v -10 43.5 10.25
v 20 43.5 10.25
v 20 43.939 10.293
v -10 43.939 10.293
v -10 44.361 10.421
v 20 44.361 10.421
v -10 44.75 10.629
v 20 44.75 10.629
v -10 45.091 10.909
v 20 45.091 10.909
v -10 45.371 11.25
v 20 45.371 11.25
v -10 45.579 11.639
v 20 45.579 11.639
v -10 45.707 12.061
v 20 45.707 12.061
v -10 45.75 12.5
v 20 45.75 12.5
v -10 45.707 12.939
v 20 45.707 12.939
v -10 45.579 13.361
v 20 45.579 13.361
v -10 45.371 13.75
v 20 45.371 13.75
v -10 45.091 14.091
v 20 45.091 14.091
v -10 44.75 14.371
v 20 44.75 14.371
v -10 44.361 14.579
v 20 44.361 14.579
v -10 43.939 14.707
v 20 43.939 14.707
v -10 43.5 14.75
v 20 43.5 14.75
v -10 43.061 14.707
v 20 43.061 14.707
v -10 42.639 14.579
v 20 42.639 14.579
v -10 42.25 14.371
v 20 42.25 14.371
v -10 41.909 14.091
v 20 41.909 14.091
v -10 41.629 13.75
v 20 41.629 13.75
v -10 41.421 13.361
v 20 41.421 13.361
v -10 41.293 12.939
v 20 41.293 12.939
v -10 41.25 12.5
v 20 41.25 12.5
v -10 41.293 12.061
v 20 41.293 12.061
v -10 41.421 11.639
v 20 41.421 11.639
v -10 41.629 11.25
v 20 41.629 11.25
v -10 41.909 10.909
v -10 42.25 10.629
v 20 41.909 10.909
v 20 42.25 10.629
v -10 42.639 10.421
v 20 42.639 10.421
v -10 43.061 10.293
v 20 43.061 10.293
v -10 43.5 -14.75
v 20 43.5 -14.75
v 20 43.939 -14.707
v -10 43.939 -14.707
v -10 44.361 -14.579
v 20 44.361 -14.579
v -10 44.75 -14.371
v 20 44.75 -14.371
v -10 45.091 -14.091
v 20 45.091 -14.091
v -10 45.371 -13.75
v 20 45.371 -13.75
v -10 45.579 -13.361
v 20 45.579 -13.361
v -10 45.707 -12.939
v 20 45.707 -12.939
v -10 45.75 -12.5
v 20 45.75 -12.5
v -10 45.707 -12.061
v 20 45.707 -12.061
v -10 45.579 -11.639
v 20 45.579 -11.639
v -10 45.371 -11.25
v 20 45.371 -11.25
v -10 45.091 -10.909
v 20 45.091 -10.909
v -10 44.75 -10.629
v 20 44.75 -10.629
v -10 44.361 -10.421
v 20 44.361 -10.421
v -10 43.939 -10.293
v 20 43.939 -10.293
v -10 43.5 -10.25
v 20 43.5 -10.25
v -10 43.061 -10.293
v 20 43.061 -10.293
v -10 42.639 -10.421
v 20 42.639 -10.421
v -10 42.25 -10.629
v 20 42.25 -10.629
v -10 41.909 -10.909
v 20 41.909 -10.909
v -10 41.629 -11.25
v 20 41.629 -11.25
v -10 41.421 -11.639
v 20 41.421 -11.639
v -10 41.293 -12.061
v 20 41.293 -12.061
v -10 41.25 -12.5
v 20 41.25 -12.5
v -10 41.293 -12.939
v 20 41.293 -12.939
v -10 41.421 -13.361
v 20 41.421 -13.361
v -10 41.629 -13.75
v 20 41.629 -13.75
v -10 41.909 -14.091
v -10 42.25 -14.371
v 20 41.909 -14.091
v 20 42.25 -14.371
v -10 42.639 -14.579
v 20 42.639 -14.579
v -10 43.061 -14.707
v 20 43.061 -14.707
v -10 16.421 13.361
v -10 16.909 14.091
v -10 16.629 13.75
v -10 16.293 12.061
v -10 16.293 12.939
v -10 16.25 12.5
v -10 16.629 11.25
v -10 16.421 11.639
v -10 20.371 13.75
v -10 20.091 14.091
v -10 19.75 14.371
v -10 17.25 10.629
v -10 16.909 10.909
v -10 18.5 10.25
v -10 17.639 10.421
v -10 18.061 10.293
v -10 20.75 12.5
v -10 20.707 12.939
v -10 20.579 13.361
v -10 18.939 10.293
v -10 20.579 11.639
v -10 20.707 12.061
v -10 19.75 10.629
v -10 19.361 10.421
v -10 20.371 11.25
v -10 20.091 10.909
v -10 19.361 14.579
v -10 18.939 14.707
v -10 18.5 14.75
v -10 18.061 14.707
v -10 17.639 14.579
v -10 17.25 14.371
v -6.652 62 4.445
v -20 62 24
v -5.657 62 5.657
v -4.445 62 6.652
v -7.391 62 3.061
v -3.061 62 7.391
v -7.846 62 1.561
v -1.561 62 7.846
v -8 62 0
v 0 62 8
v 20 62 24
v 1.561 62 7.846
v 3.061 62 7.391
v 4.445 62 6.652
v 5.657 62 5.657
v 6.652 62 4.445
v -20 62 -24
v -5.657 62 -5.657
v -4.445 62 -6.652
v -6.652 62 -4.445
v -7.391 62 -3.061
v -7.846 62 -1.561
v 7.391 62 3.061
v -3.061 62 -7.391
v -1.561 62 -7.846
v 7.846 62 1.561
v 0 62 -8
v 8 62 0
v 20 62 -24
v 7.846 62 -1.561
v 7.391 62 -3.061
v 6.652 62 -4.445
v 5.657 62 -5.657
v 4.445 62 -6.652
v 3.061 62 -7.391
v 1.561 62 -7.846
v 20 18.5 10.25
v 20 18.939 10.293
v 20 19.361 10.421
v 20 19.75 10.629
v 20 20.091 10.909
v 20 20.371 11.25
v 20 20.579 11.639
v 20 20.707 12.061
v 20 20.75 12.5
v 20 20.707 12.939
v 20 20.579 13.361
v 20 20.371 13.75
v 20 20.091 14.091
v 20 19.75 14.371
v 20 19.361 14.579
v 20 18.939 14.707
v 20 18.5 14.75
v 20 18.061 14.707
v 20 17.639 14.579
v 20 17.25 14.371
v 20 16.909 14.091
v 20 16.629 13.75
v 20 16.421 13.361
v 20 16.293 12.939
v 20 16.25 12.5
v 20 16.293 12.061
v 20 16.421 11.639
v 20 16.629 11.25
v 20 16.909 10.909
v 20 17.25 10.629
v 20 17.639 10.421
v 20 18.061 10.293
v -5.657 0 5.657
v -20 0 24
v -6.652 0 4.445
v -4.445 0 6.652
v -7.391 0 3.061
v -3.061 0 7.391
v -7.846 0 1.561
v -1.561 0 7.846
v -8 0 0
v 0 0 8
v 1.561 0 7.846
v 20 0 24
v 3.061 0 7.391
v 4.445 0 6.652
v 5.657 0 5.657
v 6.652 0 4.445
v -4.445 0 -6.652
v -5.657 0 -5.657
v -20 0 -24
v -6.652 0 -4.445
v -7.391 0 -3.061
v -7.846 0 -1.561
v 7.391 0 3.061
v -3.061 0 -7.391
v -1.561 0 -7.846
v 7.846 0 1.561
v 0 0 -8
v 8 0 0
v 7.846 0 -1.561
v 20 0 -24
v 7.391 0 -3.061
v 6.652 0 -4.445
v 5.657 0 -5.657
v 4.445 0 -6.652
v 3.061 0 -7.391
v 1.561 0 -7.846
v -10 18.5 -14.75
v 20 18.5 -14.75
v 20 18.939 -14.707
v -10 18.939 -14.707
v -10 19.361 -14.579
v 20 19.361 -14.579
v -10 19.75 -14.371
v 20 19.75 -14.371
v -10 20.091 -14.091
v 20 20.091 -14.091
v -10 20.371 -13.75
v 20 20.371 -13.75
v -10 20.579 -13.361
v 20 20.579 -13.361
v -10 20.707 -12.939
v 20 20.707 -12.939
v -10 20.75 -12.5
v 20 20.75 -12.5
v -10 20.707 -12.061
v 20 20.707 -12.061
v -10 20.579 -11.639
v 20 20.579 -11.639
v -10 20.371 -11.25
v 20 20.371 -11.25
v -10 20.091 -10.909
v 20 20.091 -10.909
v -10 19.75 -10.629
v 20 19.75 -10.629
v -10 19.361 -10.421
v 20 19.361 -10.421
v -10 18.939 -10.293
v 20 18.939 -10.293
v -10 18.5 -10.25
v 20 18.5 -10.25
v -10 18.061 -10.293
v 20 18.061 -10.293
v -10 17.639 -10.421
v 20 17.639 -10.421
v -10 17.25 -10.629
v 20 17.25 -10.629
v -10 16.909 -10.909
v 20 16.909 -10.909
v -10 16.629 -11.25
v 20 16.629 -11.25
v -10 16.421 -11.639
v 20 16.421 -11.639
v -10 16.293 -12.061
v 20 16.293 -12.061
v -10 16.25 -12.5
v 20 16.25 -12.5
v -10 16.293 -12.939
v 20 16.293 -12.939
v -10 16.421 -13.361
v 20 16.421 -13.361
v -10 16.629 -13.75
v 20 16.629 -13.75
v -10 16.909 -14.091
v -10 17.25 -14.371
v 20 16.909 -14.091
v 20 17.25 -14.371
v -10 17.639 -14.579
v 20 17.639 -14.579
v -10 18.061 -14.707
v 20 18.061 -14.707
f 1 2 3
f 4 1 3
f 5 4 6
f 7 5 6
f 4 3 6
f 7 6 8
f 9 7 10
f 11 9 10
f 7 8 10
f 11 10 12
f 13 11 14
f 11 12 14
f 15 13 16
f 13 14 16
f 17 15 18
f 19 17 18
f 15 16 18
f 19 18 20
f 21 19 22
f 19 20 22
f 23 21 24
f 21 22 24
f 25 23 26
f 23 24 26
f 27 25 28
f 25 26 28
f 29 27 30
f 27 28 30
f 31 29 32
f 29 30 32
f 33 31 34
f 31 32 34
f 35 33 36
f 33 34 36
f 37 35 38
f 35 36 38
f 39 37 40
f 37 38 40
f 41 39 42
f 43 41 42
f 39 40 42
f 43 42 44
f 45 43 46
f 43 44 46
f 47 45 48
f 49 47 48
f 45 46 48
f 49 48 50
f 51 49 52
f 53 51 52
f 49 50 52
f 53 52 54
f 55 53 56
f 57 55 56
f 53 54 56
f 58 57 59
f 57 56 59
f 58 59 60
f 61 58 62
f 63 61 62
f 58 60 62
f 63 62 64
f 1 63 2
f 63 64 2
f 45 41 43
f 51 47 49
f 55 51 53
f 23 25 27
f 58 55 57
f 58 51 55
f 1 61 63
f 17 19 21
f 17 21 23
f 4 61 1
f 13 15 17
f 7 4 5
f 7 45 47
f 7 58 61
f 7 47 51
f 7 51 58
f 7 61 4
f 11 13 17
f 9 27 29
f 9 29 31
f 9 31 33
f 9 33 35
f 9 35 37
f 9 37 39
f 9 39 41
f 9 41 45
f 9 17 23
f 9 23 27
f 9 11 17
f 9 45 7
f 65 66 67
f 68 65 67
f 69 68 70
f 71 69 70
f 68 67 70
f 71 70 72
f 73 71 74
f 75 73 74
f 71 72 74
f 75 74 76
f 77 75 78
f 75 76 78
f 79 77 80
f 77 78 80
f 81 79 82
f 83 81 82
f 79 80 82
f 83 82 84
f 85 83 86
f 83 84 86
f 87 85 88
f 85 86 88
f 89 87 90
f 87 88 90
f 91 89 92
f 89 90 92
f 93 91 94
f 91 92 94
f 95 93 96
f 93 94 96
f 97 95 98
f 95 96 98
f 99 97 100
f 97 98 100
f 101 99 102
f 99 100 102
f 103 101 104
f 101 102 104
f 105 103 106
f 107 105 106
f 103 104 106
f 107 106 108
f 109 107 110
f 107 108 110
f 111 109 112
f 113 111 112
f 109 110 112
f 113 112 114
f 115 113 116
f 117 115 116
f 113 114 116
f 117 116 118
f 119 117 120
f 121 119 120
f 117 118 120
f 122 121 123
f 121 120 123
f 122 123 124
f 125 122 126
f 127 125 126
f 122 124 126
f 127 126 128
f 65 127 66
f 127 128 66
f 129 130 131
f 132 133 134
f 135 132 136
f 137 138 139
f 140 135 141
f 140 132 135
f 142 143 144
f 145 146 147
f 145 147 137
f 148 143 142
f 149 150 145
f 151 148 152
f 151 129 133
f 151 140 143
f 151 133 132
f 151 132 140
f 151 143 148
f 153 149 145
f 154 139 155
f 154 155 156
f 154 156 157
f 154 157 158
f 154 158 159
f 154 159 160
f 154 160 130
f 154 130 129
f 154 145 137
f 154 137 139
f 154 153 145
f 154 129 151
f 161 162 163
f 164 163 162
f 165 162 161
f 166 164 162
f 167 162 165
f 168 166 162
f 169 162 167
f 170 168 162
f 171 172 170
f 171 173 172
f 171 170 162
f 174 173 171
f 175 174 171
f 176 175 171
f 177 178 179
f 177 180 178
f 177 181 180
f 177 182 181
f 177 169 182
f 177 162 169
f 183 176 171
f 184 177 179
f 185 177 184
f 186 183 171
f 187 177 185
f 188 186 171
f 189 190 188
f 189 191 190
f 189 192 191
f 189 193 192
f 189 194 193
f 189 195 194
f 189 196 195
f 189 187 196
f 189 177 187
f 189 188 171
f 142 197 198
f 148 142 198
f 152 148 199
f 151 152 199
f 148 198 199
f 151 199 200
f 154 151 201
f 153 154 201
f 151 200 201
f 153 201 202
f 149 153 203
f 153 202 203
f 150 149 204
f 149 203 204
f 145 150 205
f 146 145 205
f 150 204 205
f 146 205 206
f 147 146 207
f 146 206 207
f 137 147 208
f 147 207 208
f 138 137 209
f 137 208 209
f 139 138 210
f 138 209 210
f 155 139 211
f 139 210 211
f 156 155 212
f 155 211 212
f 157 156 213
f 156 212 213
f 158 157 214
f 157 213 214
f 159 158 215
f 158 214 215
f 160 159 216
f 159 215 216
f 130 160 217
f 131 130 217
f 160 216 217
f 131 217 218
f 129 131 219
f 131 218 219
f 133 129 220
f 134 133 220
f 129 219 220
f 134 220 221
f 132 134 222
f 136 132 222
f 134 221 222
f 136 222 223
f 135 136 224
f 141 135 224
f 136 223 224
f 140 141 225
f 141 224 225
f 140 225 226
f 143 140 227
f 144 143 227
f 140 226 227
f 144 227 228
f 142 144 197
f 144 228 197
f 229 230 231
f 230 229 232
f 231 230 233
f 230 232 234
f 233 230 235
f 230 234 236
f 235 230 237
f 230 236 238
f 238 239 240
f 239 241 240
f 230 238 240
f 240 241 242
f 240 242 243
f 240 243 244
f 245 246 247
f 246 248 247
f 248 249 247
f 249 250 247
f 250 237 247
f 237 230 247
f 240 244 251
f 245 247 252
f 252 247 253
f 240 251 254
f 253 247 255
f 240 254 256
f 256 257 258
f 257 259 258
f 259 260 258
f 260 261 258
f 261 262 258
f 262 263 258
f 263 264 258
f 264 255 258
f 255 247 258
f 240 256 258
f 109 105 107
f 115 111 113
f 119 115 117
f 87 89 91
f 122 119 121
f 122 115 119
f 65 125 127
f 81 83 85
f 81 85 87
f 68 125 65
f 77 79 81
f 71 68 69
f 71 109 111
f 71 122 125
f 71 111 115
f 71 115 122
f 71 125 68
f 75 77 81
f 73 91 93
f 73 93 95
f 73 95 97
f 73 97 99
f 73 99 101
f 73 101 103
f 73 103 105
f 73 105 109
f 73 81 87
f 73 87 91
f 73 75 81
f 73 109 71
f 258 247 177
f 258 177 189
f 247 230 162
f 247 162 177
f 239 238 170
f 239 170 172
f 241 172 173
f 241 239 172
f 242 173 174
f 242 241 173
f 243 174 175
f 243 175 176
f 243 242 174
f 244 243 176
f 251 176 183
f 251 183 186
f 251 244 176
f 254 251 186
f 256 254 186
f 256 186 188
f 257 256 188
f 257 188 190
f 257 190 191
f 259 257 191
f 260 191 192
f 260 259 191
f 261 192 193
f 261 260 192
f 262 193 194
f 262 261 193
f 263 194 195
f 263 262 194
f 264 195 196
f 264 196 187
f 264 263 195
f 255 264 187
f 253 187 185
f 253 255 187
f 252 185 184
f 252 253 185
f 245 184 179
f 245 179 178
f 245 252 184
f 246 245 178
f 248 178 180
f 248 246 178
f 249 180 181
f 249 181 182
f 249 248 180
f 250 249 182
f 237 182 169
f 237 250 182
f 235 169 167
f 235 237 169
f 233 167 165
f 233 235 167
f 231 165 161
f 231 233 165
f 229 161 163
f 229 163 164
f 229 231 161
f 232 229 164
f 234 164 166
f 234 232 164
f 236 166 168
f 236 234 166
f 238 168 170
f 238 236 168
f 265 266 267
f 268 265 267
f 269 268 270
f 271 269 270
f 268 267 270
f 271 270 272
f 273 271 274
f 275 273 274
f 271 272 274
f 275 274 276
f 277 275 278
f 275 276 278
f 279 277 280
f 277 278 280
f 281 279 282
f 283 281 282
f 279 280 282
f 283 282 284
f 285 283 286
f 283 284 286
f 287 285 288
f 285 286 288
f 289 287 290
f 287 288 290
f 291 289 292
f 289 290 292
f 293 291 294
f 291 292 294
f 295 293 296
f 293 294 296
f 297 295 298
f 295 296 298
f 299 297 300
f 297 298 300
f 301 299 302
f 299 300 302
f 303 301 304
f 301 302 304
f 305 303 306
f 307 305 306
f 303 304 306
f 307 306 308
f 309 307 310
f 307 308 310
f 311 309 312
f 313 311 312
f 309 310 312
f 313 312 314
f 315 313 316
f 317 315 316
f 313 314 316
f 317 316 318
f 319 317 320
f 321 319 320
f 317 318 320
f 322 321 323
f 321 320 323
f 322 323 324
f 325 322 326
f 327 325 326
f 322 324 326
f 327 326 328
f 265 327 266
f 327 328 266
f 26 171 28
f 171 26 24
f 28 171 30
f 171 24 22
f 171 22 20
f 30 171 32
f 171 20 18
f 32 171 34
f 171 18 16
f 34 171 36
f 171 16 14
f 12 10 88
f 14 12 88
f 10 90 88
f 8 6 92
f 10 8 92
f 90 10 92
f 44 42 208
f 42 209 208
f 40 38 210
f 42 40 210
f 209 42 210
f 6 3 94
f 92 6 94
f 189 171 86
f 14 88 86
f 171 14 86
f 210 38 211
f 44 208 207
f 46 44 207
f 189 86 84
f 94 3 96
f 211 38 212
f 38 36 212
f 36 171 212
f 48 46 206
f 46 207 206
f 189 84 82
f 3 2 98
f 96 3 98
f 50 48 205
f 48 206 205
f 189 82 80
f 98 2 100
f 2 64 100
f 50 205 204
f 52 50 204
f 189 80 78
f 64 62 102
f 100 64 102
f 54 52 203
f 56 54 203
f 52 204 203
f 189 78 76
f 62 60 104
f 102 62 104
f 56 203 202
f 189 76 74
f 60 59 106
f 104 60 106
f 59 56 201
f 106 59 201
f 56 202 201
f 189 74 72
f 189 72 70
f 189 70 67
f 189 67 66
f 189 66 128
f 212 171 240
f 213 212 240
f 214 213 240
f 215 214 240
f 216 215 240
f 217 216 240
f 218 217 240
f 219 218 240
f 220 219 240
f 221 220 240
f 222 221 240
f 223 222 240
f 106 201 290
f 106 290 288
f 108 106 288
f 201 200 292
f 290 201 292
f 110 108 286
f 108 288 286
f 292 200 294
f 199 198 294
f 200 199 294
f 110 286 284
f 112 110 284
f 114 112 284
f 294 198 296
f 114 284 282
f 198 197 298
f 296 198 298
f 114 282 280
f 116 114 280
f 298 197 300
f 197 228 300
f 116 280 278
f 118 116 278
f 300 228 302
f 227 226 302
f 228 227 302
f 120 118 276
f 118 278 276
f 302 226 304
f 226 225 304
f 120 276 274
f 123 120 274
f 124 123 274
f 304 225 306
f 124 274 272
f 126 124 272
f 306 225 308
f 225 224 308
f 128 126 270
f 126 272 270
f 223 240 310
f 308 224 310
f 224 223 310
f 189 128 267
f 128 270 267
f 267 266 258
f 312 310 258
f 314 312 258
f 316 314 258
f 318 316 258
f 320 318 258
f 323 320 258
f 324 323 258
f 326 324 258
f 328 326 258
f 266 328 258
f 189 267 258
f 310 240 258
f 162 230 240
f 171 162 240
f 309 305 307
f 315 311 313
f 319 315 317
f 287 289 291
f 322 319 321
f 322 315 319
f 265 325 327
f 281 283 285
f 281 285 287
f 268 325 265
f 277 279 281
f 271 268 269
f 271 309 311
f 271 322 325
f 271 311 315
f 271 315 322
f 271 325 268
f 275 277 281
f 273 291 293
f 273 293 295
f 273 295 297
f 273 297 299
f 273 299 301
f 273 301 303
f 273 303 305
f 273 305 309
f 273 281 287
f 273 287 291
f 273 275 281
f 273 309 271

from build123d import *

# Parameters (mm, degrees)
CROQUIS1_W              = 40
CROQUIS1_H              = 48
CROQUIS1_R              = 8
SALIENTE_EXTRUIR1_DEPTH = 62
CROQUIS2_R              = 2.25
CORTAR_EXTRUIR1_DEPTH   = 30


with BuildPart() as part:
    # Croquis1 → Saliente-Extruir1 (new body)
    with BuildSketch(Plane(origin=(0, 0, 0), x_dir=(1, 0, 0), z_dir=(0, 1, 0))):
        Rectangle(CROQUIS1_W, CROQUIS1_H)
        with Locations(Location((0, 0, 0), (0, 0, 270))):
            Circle(CROQUIS1_R, mode=Mode.SUBTRACT)
    extrude(amount=SALIENTE_EXTRUIR1_DEPTH)

    # Croquis2 → Cortar-Extruir1 (cut)
    with BuildSketch(Plane(origin=(20, 0, 0), x_dir=(0, 0, -1), z_dir=(1, 0, 0))):
        with Locations((-12.5, 43.5)):
            Circle(CROQUIS2_R)
        with Locations((12.5, 43.5)):
            Circle(CROQUIS2_R)
        with Locations((-12.5, 18.5)):
            Circle(CROQUIS2_R)
        with Locations((12.5, 18.5)):
            Circle(CROQUIS2_R)
    extrude(amount=-CORTAR_EXTRUIR1_DEPTH, mode=Mode.SUBTRACT)


solid = part.part
